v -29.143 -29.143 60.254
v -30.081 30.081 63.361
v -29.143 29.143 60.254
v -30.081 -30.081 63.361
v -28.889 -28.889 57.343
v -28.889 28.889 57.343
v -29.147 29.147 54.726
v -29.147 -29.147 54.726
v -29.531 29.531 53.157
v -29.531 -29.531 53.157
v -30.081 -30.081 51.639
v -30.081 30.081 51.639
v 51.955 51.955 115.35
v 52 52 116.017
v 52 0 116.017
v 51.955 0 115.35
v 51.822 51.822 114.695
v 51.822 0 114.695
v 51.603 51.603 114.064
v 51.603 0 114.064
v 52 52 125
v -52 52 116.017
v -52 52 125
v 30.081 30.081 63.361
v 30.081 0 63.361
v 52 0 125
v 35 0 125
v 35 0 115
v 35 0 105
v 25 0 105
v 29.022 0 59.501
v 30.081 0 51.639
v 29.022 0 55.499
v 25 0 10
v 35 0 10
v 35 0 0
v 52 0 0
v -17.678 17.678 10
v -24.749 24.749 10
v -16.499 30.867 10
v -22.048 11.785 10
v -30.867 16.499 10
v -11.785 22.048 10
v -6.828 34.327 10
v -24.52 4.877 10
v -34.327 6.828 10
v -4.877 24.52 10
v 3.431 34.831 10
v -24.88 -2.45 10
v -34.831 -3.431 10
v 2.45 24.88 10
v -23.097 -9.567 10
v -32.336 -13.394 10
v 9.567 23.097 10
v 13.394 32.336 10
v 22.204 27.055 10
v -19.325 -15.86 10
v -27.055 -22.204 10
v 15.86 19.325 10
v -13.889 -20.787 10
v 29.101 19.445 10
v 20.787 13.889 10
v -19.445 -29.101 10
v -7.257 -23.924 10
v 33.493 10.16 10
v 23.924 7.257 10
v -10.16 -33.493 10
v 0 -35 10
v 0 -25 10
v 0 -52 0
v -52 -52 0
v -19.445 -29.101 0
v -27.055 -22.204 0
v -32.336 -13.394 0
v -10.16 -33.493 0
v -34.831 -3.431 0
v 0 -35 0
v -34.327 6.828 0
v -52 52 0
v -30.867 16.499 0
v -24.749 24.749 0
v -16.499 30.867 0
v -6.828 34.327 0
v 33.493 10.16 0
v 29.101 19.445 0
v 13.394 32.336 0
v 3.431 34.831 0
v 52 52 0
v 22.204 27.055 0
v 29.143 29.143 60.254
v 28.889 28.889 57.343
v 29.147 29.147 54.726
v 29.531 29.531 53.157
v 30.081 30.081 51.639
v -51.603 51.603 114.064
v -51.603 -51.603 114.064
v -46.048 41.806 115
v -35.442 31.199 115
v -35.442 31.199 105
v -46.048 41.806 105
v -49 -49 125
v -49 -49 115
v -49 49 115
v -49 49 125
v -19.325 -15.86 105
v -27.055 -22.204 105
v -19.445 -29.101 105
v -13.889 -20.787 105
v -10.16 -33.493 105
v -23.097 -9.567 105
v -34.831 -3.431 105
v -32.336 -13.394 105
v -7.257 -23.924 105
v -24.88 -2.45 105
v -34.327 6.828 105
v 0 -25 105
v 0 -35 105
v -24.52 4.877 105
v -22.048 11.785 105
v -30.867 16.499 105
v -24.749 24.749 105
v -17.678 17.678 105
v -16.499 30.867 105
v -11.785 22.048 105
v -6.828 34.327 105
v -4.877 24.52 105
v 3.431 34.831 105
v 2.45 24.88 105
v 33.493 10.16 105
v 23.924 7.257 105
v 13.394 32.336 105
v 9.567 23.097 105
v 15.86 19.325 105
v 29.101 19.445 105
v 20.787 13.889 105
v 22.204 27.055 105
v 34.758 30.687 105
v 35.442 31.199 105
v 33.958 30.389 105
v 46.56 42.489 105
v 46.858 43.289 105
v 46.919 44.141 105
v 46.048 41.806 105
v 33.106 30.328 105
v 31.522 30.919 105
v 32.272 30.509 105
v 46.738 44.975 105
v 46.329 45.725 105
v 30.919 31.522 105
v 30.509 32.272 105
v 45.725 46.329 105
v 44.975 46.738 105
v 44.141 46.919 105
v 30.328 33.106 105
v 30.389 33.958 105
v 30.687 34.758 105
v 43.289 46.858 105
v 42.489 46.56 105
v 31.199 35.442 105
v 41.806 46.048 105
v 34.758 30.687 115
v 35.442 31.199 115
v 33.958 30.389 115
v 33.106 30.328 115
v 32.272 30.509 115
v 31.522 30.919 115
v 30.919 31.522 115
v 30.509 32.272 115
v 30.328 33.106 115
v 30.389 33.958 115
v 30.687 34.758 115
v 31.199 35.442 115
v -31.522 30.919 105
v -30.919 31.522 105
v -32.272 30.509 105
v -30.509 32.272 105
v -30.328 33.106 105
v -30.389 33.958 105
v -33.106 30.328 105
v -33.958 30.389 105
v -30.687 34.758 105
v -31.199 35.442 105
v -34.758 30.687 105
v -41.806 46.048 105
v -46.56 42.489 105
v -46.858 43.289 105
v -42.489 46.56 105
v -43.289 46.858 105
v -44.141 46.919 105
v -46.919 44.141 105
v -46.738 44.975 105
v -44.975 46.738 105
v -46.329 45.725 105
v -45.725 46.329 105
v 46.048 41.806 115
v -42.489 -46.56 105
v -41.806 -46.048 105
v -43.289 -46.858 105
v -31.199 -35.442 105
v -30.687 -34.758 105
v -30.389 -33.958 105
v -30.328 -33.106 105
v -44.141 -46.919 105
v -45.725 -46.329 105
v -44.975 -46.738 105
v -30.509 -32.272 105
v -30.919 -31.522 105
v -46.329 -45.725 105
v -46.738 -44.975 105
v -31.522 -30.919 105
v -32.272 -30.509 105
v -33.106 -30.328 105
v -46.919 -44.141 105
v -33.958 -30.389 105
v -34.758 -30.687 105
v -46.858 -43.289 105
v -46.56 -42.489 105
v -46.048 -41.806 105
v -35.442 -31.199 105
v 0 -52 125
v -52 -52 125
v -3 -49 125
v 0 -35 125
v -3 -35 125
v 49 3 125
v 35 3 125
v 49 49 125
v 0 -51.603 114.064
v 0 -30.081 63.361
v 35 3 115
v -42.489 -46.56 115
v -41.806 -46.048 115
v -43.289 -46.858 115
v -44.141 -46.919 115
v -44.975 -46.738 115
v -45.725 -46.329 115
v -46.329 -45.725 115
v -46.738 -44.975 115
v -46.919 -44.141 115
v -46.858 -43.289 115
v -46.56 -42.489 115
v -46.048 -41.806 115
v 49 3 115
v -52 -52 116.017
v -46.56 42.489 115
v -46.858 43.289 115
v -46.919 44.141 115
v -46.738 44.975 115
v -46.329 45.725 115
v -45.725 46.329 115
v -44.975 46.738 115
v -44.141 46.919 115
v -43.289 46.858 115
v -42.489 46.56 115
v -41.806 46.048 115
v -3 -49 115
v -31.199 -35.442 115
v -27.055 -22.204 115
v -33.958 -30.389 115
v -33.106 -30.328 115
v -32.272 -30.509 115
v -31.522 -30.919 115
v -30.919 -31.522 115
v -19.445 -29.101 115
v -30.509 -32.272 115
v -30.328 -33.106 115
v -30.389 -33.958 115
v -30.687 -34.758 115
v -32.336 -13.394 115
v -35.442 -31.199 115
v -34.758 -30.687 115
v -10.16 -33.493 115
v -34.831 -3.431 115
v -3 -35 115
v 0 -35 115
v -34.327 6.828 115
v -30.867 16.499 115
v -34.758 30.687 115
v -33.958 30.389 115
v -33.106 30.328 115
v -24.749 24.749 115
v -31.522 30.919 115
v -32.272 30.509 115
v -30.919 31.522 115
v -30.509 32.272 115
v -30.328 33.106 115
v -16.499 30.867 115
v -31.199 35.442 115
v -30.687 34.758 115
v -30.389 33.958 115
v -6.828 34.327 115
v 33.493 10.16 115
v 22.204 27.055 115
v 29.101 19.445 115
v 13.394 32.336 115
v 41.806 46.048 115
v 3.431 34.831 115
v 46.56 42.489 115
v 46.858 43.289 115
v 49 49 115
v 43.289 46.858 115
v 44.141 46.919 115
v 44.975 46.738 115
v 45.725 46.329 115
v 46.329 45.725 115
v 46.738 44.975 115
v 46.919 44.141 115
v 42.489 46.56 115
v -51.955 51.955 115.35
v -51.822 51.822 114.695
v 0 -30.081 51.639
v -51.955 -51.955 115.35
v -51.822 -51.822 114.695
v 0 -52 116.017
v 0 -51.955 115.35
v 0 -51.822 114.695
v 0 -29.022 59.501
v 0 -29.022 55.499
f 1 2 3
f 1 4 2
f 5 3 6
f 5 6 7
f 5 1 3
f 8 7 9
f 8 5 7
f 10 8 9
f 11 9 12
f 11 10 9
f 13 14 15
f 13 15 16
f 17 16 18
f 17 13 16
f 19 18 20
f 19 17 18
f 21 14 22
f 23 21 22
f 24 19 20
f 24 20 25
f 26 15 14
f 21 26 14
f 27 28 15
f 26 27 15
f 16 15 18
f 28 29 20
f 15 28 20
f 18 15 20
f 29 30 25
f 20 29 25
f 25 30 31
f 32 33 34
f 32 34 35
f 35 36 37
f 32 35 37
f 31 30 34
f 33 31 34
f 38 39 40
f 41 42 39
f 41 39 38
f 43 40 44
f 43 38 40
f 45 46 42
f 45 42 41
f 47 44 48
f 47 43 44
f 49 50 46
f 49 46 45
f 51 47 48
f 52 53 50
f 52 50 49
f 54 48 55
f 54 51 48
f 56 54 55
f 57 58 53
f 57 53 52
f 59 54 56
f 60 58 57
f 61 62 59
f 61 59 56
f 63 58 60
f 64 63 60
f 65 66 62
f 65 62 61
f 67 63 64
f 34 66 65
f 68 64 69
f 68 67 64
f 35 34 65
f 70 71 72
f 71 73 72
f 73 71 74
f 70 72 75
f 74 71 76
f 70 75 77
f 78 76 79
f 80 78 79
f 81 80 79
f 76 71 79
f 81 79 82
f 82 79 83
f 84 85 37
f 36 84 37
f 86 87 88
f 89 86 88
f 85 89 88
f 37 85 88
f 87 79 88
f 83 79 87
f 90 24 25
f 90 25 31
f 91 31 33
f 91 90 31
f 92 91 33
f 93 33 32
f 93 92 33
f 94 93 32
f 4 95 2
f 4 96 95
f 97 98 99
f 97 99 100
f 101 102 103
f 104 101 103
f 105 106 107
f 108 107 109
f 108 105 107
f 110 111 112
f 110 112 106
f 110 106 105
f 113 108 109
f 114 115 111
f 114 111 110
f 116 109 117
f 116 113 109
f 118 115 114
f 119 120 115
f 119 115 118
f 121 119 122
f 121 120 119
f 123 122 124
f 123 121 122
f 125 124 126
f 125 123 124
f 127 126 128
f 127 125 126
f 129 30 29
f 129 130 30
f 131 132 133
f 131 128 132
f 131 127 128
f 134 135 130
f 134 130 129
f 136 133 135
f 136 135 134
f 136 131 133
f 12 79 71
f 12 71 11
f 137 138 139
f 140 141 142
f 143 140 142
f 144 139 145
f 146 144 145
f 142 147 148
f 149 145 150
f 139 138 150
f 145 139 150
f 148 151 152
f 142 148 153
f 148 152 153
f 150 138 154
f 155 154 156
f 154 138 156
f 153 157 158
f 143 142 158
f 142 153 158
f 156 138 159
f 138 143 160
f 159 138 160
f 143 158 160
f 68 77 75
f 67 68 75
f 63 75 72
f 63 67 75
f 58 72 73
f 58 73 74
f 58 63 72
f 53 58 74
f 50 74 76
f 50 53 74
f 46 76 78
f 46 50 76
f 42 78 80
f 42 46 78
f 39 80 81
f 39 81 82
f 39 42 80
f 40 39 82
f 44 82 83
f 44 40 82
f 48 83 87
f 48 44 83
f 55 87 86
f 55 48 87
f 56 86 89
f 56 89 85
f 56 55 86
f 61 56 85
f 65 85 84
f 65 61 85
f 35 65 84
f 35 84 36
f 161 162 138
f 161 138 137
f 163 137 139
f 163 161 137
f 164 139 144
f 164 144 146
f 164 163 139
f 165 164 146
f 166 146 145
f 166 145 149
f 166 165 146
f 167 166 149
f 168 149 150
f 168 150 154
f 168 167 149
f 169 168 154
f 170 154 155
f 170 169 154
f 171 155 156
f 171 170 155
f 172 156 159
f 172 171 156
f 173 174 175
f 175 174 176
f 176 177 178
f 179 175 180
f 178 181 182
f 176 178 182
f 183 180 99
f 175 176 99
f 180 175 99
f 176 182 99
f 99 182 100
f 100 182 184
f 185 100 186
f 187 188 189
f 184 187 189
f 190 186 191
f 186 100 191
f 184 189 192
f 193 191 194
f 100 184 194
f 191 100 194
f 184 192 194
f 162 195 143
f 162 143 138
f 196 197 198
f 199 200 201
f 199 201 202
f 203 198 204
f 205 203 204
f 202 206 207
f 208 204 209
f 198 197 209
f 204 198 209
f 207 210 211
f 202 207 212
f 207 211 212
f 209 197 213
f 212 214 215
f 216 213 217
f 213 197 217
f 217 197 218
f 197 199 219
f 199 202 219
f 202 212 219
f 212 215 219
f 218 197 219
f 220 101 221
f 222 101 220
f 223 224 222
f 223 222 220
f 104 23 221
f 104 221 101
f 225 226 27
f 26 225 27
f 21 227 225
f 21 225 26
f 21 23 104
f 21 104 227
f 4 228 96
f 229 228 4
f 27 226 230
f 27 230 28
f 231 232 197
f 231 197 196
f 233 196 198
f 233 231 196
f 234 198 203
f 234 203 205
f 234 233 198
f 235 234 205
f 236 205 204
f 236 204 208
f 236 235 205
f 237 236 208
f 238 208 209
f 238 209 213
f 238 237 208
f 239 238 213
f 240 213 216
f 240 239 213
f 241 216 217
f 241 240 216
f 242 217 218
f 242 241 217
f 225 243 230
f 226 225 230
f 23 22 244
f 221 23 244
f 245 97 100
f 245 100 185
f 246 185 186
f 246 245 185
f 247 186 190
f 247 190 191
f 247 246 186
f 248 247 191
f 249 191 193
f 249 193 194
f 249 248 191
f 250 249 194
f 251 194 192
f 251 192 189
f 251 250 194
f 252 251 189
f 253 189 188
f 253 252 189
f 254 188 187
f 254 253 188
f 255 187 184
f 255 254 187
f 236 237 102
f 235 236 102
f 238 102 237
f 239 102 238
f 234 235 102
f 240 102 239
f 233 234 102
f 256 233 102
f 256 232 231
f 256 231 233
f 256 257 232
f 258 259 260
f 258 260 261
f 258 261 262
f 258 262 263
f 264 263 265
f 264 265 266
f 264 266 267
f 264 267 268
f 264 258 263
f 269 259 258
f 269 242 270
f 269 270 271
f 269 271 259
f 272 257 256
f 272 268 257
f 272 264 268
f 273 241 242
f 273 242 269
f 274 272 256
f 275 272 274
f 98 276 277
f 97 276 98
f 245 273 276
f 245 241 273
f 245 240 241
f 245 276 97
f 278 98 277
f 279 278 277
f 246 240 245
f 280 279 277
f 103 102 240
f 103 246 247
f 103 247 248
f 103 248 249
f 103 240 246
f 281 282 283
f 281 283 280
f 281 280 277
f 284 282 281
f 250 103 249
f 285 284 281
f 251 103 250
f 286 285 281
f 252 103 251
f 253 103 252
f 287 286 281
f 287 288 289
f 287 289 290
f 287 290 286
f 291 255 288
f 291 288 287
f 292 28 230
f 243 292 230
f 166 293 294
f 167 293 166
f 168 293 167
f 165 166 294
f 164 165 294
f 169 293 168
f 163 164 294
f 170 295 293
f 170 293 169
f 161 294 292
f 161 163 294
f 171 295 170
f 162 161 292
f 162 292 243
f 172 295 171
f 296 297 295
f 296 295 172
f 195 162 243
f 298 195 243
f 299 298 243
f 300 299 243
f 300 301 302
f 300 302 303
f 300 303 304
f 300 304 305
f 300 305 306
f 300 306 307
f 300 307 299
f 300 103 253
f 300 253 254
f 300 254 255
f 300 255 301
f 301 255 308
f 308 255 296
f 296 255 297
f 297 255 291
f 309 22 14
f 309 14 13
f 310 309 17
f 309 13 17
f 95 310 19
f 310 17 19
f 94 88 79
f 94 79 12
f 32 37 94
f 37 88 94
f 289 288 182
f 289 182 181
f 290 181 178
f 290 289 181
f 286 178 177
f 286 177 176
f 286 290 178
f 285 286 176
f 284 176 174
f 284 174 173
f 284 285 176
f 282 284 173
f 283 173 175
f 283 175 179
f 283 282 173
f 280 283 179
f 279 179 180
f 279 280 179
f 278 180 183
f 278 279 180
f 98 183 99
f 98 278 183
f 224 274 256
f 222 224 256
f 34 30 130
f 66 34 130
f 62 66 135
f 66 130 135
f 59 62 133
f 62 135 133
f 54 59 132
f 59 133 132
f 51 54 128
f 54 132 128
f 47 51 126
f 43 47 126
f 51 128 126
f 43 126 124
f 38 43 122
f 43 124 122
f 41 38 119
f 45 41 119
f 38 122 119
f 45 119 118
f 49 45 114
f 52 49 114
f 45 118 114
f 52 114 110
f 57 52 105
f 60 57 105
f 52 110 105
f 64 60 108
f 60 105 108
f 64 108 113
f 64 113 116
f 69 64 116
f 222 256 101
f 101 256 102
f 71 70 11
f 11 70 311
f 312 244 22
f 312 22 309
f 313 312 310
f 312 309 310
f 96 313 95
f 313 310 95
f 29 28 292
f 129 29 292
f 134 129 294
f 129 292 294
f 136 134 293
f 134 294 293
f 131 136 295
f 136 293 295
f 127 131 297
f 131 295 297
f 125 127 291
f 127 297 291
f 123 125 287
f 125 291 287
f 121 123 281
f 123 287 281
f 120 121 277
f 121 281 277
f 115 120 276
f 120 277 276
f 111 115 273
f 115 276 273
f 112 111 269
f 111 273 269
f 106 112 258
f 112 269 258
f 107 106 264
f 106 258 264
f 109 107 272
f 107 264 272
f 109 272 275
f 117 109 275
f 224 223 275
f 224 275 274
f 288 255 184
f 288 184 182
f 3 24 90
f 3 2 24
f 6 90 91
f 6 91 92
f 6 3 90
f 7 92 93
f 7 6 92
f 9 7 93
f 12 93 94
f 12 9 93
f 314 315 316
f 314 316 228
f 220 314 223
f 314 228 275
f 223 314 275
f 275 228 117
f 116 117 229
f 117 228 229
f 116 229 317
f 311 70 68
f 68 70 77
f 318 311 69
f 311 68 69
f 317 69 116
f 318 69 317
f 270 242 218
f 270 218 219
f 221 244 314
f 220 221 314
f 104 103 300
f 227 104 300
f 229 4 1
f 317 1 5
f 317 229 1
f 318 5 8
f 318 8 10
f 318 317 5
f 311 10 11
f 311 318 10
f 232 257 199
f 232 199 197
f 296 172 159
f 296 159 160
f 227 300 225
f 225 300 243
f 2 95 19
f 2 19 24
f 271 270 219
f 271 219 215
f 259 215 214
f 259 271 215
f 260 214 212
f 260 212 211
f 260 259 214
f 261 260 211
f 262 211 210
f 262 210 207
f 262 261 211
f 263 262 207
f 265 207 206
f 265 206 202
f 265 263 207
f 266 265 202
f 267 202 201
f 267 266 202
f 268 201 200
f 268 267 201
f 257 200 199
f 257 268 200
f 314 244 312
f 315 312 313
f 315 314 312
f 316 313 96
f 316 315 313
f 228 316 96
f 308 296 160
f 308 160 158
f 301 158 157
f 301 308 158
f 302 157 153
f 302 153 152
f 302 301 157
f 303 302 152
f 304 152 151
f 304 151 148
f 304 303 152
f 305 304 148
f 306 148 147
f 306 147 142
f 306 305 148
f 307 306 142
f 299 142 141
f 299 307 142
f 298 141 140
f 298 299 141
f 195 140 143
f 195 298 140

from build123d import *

# Parameters (mm, degrees)
SKETCH1_W           = 104
SKETCH1_H           = 104
BOSS_EXTRUDE1_DEPTH = 57.5
BOSS_EXTRUDE1_TAPER = 23
SKETCH2_R           = 25
CUT_EXTRUDE1_DEPTH  = 137.502747225
SKETCH3_R           = 35
CUT_EXTRUDE2_DEPTH  = 10
CUT_EXTRUDE3_START  = -10
SKETCH4_R           = 35
CUT_EXTRUDE3_DEPTH  = 10
FILLET1_R           = 15
SKETCH6_W           = 52
SKETCH6_H           = 52
CUT_EXTRUDE4_DEPTH  = 137.502747225
BOSS_EXTRUDE2_DEPTH = 10
CUT_EXTRUDE5_DEPTH  = 10
FILLET2_R           = 5


with BuildPart() as part:
    # Sketch1 → Boss-Extrude1 (new body)
    with BuildSketch(Plane.XY):
        Rectangle(SKETCH1_W, SKETCH1_H)
    extrude(amount=BOSS_EXTRUDE1_DEPTH, taper=BOSS_EXTRUDE1_TAPER)

    # Mirror13: part across plane


with BuildPart() as part_1:
    add(part.part)
    add(part.part.mirror(Plane(origin=(0, 0, 57.5), x_dir=(1, 0, 0), z_dir=(0, 0, -1))))

    # Sketch2 → Cut-Extrude1 (cut, through all)
    with BuildSketch(Plane.XY.offset(115)):
        Circle(SKETCH2_R)
    extrude(amount=-CUT_EXTRUDE1_DEPTH, mode=Mode.SUBTRACT)

    # Sketch3 → Cut-Extrude2 (cut)
    with BuildSketch(Plane.XY.offset(115)):
        Circle(SKETCH3_R)
    extrude(amount=-CUT_EXTRUDE2_DEPTH, mode=Mode.SUBTRACT)

    # Sketch4 → Cut-Extrude3 (cut)
    with BuildSketch(Plane(origin=(0, 0, 0), x_dir=(-1, 0, 0), z_dir=(0, 0, -1)).offset(CUT_EXTRUDE3_START)):
        with Locations(Location((0, 0, 0), (0, 0, 180))):
            Circle(SKETCH4_R)
    extrude(amount=CUT_EXTRUDE3_DEPTH, mode=Mode.SUBTRACT)

    # Fillet1
    fillet1_edges = [part_1.edges().sort_by_distance(p)[0] for p in [
        (27.592698068, 0, 57.5),
        (0, 27.592698068, 57.5),
        (-27.592698068, 0, 57.5),
        (0, -27.592698068, 57.5),
    ]]
    fillet(fillet1_edges, radius=FILLET1_R)

    # Sketch6 → Cut-Extrude4 (cut, through all)
    with BuildSketch(Plane.XY.offset(115)):
        with Locations((26, -26)):
            Rectangle(SKETCH6_W, SKETCH6_H)
    extrude(amount=-CUT_EXTRUDE4_DEPTH, mode=Mode.SUBTRACT)

    # Sketch7 → Boss-Extrude2 (add)
    with BuildSketch(Plane.XY.offset(115)):
        Polygon((49, 49), (49, 3), (35, 3), (35, 0), (52, 0), (52, 52), (-52, 52), (-52, -52), (0, -52), (0, -35), (-3, -35), (-3, -49), (-49, -49), (-49, 49), align=None)
    extrude(amount=BOSS_EXTRUDE2_DEPTH)

    # Sketch8 → Cut-Extrude5 (cut)
    with BuildSketch(Plane.XY.offset(115)):
        with BuildLine():
            Line((-41.805559998, 46.048200685), (-31.19895828, 35.441598967))
            ThreePointArc((-31.19895828, 35.441598967), (-31.19895828, 31.19895828), (-35.441598967, 31.19895828))
            Line((-35.441598967, 31.19895828), (-46.048200685, 41.805559998))
            ThreePointArc((-46.048200685, 41.805559998), (-46.048200685, 46.048200685), (-41.805559998, 46.048200685))
        make_face()
        with BuildLine():
            Line((46.048200685, 41.805559998), (35.441598967, 31.19895828))
            ThreePointArc((35.441598967, 31.19895828), (31.19895828, 31.19895828), (31.19895828, 35.441598967))
            Line((31.19895828, 35.441598967), (41.805559998, 46.048200685))
            ThreePointArc((41.805559998, 46.048200685), (46.048200685, 46.048200685), (46.048200685, 41.805559998))
        make_face()
        with BuildLine():
            Line((-46.048200685, -41.805559998), (-35.441598967, -31.19895828))
            ThreePointArc((-35.441598967, -31.19895828), (-31.19895828, -31.19895828), (-31.19895828, -35.441598967))
            Line((-31.19895828, -35.441598967), (-41.805559998, -46.048200685))
            ThreePointArc((-41.805559998, -46.048200685), (-46.048200685, -46.048200685), (-46.048200685, -41.805559998))
        make_face()
    extrude(amount=-CUT_EXTRUDE5_DEPTH, mode=Mode.SUBTRACT)

    # Fillet2
    fillet2_edges = [part_1.edges().sort_by_distance(p)[0] for p in [
        (0, 52, 115),
        (-52, 0, 115),
        (-26, -52, 115),
        (52, 26, 115),
    ]]
    fillet(fillet2_edges, radius=FILLET2_R)


solid = part_1.part
